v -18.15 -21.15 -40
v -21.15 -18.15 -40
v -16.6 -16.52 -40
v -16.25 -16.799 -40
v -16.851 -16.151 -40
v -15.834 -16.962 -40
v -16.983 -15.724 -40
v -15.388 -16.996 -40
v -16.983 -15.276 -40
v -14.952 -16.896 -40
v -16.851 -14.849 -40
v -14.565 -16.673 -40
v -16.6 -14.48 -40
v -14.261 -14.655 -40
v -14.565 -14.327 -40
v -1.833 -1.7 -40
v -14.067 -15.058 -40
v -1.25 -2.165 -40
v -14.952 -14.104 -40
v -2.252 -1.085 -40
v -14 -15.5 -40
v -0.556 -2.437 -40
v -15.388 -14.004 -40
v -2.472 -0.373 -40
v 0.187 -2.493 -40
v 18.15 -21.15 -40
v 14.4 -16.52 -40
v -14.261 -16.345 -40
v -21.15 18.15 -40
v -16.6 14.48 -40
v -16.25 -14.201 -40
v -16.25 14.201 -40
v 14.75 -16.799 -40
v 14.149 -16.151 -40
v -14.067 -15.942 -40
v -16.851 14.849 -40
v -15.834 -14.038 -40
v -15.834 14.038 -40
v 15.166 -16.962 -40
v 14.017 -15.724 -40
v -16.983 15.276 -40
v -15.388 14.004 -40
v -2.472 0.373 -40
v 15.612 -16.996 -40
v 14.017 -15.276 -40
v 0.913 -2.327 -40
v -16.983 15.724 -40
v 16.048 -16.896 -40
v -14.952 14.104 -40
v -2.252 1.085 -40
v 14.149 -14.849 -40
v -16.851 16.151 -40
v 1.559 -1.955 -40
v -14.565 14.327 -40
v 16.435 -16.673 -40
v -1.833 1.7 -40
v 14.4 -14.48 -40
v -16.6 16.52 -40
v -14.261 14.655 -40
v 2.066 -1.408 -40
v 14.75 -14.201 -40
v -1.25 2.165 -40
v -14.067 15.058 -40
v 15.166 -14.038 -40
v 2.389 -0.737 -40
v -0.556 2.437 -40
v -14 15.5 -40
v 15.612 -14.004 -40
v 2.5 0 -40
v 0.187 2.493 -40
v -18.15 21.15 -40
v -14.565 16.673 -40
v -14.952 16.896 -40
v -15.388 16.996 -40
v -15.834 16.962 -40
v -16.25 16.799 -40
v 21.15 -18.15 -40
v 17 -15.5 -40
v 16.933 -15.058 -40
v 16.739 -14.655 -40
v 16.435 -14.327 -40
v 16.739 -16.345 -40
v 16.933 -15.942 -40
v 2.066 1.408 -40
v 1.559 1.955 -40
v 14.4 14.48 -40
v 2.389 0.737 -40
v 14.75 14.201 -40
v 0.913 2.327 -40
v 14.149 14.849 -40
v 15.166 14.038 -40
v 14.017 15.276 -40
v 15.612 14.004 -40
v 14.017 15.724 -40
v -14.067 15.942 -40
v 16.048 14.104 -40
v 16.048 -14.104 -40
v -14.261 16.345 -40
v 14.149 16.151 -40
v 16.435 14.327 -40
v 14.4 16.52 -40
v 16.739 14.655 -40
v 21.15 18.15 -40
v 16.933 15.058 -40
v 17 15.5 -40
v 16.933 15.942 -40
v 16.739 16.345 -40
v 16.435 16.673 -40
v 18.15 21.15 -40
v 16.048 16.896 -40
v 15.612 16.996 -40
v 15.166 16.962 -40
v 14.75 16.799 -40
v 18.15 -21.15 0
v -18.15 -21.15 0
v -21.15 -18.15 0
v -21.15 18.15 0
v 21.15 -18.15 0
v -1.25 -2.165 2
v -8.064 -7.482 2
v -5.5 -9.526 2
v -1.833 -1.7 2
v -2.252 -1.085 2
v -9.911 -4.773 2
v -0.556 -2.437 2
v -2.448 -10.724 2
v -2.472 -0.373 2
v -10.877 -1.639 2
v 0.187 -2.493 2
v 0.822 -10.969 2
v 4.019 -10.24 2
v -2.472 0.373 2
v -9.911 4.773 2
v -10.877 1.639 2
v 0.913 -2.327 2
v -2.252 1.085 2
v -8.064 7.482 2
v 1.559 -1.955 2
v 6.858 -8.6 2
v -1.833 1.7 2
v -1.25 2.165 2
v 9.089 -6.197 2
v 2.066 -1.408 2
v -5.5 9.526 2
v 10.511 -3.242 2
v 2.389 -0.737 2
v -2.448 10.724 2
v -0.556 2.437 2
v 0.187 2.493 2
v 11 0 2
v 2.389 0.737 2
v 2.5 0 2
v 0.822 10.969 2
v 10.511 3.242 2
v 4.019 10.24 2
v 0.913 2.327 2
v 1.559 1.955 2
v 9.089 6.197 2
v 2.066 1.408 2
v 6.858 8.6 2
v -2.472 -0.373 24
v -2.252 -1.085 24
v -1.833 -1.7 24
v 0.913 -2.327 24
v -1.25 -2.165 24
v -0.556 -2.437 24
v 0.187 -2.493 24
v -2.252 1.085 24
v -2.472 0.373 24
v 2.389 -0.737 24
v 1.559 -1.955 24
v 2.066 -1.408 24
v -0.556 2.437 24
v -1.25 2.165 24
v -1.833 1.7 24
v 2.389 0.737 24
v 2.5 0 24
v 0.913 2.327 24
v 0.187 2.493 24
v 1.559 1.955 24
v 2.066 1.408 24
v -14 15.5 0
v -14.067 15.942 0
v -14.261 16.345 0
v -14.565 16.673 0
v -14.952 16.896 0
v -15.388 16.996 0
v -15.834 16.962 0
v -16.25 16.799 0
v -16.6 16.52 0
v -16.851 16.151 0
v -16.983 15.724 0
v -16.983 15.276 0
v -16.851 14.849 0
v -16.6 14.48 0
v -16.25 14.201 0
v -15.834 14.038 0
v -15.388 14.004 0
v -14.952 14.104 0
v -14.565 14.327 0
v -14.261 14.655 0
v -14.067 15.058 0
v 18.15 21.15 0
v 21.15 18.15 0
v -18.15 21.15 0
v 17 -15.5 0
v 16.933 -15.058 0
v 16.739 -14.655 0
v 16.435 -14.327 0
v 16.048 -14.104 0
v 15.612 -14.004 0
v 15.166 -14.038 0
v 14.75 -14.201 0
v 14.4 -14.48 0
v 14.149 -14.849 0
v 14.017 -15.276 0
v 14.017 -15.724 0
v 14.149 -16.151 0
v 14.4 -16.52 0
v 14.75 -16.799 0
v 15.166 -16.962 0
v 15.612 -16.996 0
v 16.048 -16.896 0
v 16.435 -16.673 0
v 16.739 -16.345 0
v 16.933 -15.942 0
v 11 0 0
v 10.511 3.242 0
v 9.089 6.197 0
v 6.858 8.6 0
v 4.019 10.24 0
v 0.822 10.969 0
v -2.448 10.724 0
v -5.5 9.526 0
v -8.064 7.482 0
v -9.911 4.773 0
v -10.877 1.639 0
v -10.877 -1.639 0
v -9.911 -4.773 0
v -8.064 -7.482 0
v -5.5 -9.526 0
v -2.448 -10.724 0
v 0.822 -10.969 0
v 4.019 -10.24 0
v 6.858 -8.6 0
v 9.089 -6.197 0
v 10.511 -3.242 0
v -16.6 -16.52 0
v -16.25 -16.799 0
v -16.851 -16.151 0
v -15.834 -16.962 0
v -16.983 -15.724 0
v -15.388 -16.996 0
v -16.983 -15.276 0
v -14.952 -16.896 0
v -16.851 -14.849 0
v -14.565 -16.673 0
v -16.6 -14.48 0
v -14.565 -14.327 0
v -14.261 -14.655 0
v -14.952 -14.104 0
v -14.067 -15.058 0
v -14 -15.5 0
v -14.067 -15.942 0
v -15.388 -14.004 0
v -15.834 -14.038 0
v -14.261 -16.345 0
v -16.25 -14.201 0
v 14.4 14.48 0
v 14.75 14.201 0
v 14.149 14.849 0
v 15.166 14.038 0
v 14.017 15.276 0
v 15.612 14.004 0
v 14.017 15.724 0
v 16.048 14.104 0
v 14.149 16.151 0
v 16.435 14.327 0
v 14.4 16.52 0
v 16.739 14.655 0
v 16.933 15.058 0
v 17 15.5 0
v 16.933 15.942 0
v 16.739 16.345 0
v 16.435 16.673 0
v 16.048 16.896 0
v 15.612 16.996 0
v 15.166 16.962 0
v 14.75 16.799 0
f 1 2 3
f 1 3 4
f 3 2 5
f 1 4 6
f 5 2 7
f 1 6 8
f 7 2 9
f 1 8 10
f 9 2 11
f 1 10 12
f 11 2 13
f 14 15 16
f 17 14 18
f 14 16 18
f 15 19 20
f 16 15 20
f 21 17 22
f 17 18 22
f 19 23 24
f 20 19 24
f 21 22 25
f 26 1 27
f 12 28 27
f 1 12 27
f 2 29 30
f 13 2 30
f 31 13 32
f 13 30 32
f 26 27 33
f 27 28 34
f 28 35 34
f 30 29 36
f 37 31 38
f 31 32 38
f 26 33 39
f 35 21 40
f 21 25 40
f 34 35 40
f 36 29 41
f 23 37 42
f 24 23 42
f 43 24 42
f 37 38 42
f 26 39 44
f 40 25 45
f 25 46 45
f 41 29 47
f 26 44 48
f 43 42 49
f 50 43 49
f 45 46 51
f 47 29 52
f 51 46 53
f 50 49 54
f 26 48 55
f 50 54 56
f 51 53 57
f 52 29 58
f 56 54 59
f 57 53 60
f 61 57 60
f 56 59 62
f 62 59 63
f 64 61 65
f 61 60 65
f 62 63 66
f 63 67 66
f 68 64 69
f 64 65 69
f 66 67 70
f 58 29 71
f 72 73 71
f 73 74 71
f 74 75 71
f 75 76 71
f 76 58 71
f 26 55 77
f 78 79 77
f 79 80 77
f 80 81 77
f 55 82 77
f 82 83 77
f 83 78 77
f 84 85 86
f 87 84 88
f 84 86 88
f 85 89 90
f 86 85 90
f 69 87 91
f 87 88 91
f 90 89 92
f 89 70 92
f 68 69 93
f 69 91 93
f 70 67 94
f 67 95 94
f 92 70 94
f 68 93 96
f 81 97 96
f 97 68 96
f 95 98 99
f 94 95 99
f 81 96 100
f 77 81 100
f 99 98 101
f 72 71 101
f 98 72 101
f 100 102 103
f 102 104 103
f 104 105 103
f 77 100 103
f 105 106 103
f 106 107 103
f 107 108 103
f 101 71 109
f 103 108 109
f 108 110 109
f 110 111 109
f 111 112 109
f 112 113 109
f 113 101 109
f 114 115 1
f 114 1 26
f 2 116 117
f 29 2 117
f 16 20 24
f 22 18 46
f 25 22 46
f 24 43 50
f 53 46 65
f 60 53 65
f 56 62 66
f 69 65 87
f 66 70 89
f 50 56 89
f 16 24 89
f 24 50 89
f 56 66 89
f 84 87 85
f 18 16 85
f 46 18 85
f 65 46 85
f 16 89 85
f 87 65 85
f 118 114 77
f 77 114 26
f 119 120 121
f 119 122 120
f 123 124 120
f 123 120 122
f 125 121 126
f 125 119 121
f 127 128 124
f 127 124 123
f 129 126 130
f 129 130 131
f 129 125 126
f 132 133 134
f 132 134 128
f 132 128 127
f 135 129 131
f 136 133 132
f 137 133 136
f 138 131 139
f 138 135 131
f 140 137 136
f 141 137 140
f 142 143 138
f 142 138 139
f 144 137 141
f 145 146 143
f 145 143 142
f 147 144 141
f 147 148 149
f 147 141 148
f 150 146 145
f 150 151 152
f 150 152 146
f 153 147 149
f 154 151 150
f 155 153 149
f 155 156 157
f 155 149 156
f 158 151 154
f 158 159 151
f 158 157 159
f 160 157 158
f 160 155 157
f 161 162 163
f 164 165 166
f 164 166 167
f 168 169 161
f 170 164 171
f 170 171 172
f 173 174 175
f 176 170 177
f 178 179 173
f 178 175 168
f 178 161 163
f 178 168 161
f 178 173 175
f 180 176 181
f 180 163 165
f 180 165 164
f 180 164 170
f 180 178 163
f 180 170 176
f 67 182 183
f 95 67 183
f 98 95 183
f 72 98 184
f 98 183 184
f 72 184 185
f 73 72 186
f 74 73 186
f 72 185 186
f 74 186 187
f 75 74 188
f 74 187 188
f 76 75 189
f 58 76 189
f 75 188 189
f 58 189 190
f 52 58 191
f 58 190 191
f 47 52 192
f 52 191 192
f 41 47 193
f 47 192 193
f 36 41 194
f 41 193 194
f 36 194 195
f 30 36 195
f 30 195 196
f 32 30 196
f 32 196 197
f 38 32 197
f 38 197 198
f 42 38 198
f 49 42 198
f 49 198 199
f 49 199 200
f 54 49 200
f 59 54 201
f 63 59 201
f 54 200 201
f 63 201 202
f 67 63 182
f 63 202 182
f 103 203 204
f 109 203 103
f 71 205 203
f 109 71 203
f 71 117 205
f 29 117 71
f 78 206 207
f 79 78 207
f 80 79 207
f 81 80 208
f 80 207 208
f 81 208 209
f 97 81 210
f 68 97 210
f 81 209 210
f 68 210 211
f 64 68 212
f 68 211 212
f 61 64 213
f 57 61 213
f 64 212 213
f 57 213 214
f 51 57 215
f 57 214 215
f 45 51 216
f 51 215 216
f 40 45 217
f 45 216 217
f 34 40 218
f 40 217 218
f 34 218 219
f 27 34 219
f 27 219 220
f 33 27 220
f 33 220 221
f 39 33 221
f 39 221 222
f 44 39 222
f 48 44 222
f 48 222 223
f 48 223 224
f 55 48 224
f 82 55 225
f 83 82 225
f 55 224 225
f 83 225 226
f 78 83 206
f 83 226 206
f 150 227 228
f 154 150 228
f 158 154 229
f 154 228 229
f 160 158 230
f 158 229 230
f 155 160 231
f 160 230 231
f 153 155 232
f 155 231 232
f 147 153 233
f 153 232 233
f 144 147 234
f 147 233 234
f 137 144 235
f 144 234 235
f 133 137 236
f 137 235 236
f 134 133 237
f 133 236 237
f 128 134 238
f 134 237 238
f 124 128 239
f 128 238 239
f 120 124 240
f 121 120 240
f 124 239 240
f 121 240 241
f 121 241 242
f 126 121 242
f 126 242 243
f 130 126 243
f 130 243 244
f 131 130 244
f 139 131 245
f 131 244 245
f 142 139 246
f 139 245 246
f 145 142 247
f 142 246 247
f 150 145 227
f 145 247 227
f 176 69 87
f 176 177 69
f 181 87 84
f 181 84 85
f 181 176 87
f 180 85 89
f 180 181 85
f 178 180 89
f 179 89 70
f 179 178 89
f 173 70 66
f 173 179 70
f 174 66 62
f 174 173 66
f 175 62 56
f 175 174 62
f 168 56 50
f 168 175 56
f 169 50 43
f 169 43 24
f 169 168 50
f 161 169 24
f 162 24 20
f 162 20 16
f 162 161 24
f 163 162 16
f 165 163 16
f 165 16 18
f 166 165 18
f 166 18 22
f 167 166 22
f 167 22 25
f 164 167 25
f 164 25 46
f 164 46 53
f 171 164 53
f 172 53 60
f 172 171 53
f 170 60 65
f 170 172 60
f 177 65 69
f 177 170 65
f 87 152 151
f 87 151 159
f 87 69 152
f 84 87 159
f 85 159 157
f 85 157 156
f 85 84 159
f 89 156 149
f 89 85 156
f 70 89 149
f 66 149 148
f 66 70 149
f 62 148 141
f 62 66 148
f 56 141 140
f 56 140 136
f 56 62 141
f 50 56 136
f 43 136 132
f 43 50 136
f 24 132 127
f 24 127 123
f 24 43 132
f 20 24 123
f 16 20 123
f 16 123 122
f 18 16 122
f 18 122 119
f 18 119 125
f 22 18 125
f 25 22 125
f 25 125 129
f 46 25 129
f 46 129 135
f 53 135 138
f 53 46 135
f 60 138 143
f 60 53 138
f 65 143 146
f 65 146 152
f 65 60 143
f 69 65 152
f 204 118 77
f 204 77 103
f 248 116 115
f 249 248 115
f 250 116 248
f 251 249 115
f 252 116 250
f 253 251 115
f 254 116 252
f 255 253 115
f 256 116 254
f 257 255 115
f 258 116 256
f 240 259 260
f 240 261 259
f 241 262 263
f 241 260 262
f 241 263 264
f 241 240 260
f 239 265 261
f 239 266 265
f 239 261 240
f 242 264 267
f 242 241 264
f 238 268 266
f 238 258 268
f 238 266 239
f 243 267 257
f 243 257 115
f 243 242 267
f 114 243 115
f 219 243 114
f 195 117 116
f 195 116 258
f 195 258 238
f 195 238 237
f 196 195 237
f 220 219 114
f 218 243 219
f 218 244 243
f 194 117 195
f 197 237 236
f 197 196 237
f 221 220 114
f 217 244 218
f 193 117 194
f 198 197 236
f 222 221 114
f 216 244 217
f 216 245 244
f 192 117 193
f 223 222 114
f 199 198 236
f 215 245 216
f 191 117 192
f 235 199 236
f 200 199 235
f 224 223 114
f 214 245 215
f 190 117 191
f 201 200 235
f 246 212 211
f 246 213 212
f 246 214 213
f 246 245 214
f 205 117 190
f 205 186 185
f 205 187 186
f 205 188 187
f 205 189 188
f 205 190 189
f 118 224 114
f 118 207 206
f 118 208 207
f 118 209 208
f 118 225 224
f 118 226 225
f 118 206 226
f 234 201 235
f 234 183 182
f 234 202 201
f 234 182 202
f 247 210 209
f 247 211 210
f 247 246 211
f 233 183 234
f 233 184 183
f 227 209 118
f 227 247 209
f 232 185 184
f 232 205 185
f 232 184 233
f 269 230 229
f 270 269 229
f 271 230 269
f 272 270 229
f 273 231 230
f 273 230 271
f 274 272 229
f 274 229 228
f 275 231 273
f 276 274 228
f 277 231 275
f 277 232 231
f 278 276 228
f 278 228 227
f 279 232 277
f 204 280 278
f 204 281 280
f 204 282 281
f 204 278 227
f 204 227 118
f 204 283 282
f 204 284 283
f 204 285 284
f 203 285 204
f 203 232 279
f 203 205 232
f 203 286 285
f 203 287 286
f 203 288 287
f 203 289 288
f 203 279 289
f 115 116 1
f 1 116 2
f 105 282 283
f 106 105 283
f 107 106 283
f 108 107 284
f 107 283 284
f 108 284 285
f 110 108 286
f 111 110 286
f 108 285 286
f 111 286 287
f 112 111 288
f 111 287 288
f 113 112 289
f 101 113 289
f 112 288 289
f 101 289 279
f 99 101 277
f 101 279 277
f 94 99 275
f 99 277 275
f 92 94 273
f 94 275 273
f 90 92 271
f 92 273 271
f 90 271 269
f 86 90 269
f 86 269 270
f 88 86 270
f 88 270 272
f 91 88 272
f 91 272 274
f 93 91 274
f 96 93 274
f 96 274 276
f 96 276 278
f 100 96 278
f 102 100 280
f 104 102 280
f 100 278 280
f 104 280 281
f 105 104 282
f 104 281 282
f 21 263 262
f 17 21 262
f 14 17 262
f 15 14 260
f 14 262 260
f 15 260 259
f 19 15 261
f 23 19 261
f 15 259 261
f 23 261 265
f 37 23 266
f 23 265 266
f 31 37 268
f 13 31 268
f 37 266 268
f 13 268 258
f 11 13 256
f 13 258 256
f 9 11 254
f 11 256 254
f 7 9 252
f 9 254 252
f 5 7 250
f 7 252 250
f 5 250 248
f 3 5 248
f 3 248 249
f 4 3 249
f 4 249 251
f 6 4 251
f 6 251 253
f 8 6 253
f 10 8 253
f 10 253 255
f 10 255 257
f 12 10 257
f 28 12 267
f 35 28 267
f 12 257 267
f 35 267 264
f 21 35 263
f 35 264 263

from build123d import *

# Parameters (mm, degrees)
F0_W          = 42.3
F0_H          = 42.3
F0_R          = 1.5
F0_R_2        = 11
F0_R_3        = 2.5
F1_DEPTH      = 40
F2_DEPTH      = 40
F3_DEPTH      = 2
F4_R          = 2.5
F5_DEPTH      = 24
F5_DEPTH_BACK = 40
F6_SIZE       = 3


with BuildPart() as f1:
    # F0 (on Top) → F1 (new body)
    with BuildSketch(Plane.XY):
        Rectangle(F0_W, F0_H)
        with Locations((-15.5, -15.5)):
            Circle(F0_R, mode=Mode.SUBTRACT)
        with Locations((15.5, -15.5)):
            Circle(F0_R, mode=Mode.SUBTRACT)
        with Locations((-15.5, 15.5)):
            Circle(F0_R, mode=Mode.SUBTRACT)
        Circle(F0_R_2, mode=Mode.SUBTRACT)
        with Locations((15.5, 15.5)):
            Circle(F0_R, mode=Mode.SUBTRACT)
        with Locations((-15.5, 15.5)):
            Circle(F0_R)
        with Locations((-15.5, -15.5)):
            Circle(F0_R)
        with Locations((15.5, -15.5)):
            Circle(F0_R)
        Circle(F0_R_2)
        Circle(F0_R_3, mode=Mode.SUBTRACT)
        with Locations((15.5, 15.5)):
            Circle(F0_R)
    extrude(amount=-F1_DEPTH)

    # F0 (on Top) → F2 (cut)
    with BuildSketch(Plane.XY):
        with Locations((-15.5, 15.5)):
            Circle(F0_R)
        with Locations((-15.5, -15.5)):
            Circle(F0_R)
        with Locations((15.5, -15.5)):
            Circle(F0_R)
        with Locations((15.5, 15.5)):
            Circle(F0_R)
    extrude(amount=-F2_DEPTH, mode=Mode.SUBTRACT)

    # F0 (on Top) → F3 (join)
    with BuildSketch(Plane.XY):
        Circle(F0_R_2)
        Circle(F0_R_3, mode=Mode.SUBTRACT)
    extrude(amount=F3_DEPTH)

    # F6
    f6_edges = [f1.edges().sort_by_distance(p)[0] for p in [
        (21.15, -21.15, -20),
        (21.15, 21.15, -20),
        (-21.15, -21.15, -20),
        (-21.15, 21.15, -20),
    ]]
    chamfer(f6_edges, length=F6_SIZE)


with BuildPart() as f5:
    # F4 (on Top) → F5 (new body, two sides)
    with BuildSketch(Plane.XY) as f5_sk:
        Circle(F4_R)
    extrude(amount=F5_DEPTH)
    extrude(f5_sk.sketch, amount=-F5_DEPTH_BACK)


solid = Compound([f1.part, f5.part])
